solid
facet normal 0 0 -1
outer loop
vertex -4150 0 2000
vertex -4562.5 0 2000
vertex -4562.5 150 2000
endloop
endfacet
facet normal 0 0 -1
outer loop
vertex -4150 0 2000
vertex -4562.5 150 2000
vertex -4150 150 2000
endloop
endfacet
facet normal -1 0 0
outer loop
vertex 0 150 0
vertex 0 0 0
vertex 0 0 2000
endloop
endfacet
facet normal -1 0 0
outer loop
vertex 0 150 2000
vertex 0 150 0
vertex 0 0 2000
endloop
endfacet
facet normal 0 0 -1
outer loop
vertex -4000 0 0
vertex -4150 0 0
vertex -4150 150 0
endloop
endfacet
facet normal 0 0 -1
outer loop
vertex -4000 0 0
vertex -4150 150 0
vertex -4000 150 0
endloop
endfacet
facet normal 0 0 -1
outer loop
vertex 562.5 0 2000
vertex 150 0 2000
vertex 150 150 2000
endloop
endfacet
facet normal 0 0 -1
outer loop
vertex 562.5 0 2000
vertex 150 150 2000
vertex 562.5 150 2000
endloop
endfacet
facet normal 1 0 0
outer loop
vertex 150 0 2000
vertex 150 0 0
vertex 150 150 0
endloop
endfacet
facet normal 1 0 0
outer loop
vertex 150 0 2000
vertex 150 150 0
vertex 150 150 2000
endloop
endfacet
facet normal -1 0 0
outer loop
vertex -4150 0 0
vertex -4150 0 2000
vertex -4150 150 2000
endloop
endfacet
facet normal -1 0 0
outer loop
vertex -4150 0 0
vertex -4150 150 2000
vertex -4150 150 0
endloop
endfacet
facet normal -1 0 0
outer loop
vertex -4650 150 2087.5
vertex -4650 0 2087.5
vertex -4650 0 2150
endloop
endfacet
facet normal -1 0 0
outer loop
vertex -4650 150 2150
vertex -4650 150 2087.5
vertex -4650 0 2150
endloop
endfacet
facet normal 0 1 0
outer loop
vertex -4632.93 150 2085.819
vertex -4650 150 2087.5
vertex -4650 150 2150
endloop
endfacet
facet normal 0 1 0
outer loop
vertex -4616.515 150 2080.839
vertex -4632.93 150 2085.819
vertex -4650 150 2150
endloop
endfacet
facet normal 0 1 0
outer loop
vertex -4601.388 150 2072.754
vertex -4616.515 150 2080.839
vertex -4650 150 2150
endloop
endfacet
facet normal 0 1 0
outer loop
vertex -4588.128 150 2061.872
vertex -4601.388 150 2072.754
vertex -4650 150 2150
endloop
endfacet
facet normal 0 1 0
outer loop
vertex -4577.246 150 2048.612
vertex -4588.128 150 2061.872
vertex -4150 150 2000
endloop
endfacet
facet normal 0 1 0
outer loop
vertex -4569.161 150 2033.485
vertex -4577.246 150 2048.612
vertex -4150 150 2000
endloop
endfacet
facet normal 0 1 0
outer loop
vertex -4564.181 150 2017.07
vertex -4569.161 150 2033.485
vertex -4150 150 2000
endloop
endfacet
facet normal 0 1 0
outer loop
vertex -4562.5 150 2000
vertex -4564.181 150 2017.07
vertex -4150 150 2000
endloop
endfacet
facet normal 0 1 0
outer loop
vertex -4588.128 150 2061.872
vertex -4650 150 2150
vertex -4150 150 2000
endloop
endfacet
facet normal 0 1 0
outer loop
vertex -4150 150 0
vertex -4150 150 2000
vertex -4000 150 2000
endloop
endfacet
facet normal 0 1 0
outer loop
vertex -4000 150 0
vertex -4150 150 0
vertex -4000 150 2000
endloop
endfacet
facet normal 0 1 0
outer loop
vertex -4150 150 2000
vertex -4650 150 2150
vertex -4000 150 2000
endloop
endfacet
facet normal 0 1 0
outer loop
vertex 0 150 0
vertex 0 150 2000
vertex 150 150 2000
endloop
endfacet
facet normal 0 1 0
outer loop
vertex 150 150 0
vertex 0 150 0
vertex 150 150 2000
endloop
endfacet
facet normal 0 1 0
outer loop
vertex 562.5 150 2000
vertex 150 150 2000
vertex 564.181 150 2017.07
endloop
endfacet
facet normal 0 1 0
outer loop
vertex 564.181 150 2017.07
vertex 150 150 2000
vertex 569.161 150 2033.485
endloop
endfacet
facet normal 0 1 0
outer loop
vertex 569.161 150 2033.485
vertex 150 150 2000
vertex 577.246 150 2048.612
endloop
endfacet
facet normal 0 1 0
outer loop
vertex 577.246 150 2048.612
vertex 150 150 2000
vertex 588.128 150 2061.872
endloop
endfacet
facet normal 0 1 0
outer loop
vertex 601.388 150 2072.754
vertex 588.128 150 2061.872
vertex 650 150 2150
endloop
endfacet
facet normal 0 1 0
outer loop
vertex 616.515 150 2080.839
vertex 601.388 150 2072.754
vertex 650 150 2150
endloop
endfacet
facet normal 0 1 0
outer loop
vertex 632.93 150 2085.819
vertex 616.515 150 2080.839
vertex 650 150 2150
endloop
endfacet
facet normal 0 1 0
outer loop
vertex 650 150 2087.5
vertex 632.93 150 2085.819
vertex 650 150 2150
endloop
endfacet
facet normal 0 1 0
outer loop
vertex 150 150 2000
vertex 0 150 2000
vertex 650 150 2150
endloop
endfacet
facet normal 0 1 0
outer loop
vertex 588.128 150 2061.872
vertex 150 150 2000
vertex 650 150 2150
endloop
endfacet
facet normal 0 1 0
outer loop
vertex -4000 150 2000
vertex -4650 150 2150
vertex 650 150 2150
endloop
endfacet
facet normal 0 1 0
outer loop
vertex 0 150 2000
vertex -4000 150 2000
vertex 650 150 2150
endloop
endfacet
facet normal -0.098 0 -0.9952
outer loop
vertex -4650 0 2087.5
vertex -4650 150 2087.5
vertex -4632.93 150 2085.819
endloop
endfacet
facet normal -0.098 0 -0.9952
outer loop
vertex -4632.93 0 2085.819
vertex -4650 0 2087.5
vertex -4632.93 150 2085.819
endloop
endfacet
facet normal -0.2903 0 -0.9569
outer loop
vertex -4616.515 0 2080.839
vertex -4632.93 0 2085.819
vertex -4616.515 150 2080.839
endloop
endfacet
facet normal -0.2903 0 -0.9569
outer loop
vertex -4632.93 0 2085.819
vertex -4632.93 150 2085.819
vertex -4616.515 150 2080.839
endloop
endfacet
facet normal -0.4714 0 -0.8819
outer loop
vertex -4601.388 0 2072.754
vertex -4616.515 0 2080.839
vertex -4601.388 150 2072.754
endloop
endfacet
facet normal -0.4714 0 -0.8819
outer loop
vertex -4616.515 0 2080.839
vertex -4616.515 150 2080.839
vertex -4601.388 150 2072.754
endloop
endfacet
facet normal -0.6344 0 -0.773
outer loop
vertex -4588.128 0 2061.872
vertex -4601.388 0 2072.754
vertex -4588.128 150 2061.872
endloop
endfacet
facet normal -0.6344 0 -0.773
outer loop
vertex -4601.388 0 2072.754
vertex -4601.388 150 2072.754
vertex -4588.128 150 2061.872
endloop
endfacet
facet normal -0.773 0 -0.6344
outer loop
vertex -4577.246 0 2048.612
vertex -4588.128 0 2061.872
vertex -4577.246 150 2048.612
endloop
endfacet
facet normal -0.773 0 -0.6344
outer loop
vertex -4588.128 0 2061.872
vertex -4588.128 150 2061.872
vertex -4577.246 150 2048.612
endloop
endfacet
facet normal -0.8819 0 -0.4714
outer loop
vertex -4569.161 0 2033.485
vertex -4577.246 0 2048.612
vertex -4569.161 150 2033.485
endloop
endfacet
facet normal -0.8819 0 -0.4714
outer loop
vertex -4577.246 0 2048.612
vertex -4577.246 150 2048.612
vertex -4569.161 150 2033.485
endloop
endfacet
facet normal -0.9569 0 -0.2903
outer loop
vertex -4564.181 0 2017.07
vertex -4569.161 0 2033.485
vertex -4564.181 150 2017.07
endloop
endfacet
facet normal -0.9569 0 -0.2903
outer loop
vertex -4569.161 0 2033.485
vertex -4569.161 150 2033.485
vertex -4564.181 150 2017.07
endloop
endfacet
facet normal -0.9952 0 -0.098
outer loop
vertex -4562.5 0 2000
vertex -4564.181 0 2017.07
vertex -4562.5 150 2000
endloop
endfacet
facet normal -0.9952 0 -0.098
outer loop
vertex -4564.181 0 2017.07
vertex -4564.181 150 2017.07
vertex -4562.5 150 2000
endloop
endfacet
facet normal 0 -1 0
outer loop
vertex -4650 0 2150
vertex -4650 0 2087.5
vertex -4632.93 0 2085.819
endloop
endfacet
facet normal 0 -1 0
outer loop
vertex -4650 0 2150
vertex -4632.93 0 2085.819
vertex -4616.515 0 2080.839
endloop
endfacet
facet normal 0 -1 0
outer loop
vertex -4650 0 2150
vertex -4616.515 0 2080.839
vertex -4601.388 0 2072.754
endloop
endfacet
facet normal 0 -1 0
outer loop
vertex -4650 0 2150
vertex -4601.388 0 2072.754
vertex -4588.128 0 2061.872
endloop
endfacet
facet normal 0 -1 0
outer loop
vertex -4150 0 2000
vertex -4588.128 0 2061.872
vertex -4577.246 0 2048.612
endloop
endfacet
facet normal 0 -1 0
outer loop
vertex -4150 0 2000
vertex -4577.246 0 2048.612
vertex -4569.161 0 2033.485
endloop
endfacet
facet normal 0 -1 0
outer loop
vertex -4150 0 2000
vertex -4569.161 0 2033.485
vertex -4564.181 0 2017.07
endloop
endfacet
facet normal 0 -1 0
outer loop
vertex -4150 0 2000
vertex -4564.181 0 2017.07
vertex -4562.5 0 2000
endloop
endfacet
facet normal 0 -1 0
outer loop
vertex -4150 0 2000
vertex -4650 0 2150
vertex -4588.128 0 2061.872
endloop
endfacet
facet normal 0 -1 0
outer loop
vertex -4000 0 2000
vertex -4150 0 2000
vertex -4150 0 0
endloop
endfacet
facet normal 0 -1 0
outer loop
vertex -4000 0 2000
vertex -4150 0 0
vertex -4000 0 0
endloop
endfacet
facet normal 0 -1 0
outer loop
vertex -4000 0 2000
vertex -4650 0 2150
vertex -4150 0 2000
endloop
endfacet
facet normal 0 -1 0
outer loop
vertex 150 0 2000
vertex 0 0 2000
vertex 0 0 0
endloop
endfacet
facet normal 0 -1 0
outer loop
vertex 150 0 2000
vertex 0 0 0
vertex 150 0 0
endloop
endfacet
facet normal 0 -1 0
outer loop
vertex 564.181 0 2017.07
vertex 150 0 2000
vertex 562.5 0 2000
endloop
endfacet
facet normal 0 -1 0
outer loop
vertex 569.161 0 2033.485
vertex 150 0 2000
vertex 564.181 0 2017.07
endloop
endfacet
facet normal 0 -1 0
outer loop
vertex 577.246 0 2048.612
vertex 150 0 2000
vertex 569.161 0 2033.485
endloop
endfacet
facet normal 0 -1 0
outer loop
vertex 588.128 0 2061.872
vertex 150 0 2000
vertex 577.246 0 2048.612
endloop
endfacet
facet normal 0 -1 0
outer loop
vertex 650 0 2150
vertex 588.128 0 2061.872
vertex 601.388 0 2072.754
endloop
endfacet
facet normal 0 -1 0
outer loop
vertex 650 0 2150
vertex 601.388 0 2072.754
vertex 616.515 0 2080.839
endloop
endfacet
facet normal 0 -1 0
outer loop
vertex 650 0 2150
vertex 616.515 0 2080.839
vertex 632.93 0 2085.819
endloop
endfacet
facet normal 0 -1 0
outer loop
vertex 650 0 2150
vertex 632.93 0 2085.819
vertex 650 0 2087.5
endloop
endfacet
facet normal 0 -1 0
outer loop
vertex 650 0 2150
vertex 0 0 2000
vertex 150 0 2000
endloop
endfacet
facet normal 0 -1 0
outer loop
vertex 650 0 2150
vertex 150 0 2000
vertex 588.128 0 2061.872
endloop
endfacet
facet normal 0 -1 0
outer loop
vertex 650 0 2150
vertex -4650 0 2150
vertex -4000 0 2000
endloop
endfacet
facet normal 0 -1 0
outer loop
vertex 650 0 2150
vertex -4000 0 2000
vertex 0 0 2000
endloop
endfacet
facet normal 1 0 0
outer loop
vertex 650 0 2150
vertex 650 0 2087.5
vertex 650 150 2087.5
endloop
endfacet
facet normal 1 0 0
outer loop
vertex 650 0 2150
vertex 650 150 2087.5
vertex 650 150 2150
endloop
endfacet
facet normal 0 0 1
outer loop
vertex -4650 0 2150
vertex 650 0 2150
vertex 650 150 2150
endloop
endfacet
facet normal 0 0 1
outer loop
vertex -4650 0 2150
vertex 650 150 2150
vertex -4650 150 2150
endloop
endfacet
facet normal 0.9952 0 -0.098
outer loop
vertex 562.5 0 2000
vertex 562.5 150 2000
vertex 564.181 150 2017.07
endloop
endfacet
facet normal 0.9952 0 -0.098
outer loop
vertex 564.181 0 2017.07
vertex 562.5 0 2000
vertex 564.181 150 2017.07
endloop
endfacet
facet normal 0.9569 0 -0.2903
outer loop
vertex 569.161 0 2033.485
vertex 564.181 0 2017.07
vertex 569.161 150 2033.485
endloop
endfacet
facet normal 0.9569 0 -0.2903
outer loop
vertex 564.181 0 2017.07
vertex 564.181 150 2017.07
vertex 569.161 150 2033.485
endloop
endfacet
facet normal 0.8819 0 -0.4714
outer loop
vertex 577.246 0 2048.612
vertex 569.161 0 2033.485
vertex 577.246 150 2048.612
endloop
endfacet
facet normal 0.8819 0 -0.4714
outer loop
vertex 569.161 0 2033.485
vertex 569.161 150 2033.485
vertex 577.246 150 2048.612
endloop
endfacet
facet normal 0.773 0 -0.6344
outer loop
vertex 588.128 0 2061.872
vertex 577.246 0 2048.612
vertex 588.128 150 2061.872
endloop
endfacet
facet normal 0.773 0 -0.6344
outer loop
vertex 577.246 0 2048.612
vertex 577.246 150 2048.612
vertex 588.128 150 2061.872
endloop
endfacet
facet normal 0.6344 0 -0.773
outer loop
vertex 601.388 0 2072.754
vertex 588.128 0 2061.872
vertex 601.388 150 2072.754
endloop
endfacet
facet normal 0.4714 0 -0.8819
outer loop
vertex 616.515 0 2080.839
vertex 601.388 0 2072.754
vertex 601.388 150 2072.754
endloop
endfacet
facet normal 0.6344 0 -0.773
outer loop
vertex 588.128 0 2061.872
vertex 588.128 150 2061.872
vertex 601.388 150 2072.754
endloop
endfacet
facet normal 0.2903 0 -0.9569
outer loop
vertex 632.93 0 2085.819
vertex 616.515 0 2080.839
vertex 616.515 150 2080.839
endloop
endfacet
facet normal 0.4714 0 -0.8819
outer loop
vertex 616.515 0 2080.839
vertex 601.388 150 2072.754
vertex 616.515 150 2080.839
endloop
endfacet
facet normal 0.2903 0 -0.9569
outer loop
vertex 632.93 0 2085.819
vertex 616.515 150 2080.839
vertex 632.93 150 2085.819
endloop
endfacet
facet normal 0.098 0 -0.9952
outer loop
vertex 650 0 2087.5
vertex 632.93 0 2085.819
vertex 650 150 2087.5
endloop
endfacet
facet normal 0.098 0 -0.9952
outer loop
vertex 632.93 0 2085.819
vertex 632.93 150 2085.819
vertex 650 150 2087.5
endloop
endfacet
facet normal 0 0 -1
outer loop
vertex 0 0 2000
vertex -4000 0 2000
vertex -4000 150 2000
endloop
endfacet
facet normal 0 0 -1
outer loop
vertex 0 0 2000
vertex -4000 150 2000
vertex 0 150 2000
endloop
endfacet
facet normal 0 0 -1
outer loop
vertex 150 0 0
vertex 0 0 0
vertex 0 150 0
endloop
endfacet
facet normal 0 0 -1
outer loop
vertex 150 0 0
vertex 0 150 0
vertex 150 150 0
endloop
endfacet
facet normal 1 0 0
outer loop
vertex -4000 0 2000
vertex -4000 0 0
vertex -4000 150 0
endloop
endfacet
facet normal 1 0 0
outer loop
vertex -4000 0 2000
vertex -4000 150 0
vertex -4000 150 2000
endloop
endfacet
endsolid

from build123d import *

# Parameters (mm, degrees)
F0_W     = 150
F0_H     = 2000
F0_W_2   = 500
F0_H_2   = 150
F1_DEPTH = 150
F2_D     = 175
F3_D     = 175


with BuildPart() as f1:
    # F0 (on Front) → F1 (new body)
    with BuildSketch(Plane.XZ):
        with Locations((75, 1000)):
            Rectangle(F0_W, F0_H)
        Polygon((-4000, 2000), (0, 2000), (150, 2000), (150, 2150), (-4150, 2150), (-4150, 2000), align=None)
        with Locations((400, 2075)):
            Rectangle(F0_W_2, F0_H_2)
        with Locations((-4075, 1000)):
            Rectangle(F0_W, F0_H)
        with Locations((-4400, 2075)):
            Rectangle(F0_W_2, F0_H_2)
    extrude(amount=-F1_DEPTH)

    # F2 (through all)
    with Locations(Plane.XZ):
        with Locations((-4650, 2000)):
            Hole(F2_D / 2)

    # F3 (through all)
    with Locations(Plane.XZ):
        with Locations((650, 2000)):
            Hole(F3_D / 2)


solid = f1.part
